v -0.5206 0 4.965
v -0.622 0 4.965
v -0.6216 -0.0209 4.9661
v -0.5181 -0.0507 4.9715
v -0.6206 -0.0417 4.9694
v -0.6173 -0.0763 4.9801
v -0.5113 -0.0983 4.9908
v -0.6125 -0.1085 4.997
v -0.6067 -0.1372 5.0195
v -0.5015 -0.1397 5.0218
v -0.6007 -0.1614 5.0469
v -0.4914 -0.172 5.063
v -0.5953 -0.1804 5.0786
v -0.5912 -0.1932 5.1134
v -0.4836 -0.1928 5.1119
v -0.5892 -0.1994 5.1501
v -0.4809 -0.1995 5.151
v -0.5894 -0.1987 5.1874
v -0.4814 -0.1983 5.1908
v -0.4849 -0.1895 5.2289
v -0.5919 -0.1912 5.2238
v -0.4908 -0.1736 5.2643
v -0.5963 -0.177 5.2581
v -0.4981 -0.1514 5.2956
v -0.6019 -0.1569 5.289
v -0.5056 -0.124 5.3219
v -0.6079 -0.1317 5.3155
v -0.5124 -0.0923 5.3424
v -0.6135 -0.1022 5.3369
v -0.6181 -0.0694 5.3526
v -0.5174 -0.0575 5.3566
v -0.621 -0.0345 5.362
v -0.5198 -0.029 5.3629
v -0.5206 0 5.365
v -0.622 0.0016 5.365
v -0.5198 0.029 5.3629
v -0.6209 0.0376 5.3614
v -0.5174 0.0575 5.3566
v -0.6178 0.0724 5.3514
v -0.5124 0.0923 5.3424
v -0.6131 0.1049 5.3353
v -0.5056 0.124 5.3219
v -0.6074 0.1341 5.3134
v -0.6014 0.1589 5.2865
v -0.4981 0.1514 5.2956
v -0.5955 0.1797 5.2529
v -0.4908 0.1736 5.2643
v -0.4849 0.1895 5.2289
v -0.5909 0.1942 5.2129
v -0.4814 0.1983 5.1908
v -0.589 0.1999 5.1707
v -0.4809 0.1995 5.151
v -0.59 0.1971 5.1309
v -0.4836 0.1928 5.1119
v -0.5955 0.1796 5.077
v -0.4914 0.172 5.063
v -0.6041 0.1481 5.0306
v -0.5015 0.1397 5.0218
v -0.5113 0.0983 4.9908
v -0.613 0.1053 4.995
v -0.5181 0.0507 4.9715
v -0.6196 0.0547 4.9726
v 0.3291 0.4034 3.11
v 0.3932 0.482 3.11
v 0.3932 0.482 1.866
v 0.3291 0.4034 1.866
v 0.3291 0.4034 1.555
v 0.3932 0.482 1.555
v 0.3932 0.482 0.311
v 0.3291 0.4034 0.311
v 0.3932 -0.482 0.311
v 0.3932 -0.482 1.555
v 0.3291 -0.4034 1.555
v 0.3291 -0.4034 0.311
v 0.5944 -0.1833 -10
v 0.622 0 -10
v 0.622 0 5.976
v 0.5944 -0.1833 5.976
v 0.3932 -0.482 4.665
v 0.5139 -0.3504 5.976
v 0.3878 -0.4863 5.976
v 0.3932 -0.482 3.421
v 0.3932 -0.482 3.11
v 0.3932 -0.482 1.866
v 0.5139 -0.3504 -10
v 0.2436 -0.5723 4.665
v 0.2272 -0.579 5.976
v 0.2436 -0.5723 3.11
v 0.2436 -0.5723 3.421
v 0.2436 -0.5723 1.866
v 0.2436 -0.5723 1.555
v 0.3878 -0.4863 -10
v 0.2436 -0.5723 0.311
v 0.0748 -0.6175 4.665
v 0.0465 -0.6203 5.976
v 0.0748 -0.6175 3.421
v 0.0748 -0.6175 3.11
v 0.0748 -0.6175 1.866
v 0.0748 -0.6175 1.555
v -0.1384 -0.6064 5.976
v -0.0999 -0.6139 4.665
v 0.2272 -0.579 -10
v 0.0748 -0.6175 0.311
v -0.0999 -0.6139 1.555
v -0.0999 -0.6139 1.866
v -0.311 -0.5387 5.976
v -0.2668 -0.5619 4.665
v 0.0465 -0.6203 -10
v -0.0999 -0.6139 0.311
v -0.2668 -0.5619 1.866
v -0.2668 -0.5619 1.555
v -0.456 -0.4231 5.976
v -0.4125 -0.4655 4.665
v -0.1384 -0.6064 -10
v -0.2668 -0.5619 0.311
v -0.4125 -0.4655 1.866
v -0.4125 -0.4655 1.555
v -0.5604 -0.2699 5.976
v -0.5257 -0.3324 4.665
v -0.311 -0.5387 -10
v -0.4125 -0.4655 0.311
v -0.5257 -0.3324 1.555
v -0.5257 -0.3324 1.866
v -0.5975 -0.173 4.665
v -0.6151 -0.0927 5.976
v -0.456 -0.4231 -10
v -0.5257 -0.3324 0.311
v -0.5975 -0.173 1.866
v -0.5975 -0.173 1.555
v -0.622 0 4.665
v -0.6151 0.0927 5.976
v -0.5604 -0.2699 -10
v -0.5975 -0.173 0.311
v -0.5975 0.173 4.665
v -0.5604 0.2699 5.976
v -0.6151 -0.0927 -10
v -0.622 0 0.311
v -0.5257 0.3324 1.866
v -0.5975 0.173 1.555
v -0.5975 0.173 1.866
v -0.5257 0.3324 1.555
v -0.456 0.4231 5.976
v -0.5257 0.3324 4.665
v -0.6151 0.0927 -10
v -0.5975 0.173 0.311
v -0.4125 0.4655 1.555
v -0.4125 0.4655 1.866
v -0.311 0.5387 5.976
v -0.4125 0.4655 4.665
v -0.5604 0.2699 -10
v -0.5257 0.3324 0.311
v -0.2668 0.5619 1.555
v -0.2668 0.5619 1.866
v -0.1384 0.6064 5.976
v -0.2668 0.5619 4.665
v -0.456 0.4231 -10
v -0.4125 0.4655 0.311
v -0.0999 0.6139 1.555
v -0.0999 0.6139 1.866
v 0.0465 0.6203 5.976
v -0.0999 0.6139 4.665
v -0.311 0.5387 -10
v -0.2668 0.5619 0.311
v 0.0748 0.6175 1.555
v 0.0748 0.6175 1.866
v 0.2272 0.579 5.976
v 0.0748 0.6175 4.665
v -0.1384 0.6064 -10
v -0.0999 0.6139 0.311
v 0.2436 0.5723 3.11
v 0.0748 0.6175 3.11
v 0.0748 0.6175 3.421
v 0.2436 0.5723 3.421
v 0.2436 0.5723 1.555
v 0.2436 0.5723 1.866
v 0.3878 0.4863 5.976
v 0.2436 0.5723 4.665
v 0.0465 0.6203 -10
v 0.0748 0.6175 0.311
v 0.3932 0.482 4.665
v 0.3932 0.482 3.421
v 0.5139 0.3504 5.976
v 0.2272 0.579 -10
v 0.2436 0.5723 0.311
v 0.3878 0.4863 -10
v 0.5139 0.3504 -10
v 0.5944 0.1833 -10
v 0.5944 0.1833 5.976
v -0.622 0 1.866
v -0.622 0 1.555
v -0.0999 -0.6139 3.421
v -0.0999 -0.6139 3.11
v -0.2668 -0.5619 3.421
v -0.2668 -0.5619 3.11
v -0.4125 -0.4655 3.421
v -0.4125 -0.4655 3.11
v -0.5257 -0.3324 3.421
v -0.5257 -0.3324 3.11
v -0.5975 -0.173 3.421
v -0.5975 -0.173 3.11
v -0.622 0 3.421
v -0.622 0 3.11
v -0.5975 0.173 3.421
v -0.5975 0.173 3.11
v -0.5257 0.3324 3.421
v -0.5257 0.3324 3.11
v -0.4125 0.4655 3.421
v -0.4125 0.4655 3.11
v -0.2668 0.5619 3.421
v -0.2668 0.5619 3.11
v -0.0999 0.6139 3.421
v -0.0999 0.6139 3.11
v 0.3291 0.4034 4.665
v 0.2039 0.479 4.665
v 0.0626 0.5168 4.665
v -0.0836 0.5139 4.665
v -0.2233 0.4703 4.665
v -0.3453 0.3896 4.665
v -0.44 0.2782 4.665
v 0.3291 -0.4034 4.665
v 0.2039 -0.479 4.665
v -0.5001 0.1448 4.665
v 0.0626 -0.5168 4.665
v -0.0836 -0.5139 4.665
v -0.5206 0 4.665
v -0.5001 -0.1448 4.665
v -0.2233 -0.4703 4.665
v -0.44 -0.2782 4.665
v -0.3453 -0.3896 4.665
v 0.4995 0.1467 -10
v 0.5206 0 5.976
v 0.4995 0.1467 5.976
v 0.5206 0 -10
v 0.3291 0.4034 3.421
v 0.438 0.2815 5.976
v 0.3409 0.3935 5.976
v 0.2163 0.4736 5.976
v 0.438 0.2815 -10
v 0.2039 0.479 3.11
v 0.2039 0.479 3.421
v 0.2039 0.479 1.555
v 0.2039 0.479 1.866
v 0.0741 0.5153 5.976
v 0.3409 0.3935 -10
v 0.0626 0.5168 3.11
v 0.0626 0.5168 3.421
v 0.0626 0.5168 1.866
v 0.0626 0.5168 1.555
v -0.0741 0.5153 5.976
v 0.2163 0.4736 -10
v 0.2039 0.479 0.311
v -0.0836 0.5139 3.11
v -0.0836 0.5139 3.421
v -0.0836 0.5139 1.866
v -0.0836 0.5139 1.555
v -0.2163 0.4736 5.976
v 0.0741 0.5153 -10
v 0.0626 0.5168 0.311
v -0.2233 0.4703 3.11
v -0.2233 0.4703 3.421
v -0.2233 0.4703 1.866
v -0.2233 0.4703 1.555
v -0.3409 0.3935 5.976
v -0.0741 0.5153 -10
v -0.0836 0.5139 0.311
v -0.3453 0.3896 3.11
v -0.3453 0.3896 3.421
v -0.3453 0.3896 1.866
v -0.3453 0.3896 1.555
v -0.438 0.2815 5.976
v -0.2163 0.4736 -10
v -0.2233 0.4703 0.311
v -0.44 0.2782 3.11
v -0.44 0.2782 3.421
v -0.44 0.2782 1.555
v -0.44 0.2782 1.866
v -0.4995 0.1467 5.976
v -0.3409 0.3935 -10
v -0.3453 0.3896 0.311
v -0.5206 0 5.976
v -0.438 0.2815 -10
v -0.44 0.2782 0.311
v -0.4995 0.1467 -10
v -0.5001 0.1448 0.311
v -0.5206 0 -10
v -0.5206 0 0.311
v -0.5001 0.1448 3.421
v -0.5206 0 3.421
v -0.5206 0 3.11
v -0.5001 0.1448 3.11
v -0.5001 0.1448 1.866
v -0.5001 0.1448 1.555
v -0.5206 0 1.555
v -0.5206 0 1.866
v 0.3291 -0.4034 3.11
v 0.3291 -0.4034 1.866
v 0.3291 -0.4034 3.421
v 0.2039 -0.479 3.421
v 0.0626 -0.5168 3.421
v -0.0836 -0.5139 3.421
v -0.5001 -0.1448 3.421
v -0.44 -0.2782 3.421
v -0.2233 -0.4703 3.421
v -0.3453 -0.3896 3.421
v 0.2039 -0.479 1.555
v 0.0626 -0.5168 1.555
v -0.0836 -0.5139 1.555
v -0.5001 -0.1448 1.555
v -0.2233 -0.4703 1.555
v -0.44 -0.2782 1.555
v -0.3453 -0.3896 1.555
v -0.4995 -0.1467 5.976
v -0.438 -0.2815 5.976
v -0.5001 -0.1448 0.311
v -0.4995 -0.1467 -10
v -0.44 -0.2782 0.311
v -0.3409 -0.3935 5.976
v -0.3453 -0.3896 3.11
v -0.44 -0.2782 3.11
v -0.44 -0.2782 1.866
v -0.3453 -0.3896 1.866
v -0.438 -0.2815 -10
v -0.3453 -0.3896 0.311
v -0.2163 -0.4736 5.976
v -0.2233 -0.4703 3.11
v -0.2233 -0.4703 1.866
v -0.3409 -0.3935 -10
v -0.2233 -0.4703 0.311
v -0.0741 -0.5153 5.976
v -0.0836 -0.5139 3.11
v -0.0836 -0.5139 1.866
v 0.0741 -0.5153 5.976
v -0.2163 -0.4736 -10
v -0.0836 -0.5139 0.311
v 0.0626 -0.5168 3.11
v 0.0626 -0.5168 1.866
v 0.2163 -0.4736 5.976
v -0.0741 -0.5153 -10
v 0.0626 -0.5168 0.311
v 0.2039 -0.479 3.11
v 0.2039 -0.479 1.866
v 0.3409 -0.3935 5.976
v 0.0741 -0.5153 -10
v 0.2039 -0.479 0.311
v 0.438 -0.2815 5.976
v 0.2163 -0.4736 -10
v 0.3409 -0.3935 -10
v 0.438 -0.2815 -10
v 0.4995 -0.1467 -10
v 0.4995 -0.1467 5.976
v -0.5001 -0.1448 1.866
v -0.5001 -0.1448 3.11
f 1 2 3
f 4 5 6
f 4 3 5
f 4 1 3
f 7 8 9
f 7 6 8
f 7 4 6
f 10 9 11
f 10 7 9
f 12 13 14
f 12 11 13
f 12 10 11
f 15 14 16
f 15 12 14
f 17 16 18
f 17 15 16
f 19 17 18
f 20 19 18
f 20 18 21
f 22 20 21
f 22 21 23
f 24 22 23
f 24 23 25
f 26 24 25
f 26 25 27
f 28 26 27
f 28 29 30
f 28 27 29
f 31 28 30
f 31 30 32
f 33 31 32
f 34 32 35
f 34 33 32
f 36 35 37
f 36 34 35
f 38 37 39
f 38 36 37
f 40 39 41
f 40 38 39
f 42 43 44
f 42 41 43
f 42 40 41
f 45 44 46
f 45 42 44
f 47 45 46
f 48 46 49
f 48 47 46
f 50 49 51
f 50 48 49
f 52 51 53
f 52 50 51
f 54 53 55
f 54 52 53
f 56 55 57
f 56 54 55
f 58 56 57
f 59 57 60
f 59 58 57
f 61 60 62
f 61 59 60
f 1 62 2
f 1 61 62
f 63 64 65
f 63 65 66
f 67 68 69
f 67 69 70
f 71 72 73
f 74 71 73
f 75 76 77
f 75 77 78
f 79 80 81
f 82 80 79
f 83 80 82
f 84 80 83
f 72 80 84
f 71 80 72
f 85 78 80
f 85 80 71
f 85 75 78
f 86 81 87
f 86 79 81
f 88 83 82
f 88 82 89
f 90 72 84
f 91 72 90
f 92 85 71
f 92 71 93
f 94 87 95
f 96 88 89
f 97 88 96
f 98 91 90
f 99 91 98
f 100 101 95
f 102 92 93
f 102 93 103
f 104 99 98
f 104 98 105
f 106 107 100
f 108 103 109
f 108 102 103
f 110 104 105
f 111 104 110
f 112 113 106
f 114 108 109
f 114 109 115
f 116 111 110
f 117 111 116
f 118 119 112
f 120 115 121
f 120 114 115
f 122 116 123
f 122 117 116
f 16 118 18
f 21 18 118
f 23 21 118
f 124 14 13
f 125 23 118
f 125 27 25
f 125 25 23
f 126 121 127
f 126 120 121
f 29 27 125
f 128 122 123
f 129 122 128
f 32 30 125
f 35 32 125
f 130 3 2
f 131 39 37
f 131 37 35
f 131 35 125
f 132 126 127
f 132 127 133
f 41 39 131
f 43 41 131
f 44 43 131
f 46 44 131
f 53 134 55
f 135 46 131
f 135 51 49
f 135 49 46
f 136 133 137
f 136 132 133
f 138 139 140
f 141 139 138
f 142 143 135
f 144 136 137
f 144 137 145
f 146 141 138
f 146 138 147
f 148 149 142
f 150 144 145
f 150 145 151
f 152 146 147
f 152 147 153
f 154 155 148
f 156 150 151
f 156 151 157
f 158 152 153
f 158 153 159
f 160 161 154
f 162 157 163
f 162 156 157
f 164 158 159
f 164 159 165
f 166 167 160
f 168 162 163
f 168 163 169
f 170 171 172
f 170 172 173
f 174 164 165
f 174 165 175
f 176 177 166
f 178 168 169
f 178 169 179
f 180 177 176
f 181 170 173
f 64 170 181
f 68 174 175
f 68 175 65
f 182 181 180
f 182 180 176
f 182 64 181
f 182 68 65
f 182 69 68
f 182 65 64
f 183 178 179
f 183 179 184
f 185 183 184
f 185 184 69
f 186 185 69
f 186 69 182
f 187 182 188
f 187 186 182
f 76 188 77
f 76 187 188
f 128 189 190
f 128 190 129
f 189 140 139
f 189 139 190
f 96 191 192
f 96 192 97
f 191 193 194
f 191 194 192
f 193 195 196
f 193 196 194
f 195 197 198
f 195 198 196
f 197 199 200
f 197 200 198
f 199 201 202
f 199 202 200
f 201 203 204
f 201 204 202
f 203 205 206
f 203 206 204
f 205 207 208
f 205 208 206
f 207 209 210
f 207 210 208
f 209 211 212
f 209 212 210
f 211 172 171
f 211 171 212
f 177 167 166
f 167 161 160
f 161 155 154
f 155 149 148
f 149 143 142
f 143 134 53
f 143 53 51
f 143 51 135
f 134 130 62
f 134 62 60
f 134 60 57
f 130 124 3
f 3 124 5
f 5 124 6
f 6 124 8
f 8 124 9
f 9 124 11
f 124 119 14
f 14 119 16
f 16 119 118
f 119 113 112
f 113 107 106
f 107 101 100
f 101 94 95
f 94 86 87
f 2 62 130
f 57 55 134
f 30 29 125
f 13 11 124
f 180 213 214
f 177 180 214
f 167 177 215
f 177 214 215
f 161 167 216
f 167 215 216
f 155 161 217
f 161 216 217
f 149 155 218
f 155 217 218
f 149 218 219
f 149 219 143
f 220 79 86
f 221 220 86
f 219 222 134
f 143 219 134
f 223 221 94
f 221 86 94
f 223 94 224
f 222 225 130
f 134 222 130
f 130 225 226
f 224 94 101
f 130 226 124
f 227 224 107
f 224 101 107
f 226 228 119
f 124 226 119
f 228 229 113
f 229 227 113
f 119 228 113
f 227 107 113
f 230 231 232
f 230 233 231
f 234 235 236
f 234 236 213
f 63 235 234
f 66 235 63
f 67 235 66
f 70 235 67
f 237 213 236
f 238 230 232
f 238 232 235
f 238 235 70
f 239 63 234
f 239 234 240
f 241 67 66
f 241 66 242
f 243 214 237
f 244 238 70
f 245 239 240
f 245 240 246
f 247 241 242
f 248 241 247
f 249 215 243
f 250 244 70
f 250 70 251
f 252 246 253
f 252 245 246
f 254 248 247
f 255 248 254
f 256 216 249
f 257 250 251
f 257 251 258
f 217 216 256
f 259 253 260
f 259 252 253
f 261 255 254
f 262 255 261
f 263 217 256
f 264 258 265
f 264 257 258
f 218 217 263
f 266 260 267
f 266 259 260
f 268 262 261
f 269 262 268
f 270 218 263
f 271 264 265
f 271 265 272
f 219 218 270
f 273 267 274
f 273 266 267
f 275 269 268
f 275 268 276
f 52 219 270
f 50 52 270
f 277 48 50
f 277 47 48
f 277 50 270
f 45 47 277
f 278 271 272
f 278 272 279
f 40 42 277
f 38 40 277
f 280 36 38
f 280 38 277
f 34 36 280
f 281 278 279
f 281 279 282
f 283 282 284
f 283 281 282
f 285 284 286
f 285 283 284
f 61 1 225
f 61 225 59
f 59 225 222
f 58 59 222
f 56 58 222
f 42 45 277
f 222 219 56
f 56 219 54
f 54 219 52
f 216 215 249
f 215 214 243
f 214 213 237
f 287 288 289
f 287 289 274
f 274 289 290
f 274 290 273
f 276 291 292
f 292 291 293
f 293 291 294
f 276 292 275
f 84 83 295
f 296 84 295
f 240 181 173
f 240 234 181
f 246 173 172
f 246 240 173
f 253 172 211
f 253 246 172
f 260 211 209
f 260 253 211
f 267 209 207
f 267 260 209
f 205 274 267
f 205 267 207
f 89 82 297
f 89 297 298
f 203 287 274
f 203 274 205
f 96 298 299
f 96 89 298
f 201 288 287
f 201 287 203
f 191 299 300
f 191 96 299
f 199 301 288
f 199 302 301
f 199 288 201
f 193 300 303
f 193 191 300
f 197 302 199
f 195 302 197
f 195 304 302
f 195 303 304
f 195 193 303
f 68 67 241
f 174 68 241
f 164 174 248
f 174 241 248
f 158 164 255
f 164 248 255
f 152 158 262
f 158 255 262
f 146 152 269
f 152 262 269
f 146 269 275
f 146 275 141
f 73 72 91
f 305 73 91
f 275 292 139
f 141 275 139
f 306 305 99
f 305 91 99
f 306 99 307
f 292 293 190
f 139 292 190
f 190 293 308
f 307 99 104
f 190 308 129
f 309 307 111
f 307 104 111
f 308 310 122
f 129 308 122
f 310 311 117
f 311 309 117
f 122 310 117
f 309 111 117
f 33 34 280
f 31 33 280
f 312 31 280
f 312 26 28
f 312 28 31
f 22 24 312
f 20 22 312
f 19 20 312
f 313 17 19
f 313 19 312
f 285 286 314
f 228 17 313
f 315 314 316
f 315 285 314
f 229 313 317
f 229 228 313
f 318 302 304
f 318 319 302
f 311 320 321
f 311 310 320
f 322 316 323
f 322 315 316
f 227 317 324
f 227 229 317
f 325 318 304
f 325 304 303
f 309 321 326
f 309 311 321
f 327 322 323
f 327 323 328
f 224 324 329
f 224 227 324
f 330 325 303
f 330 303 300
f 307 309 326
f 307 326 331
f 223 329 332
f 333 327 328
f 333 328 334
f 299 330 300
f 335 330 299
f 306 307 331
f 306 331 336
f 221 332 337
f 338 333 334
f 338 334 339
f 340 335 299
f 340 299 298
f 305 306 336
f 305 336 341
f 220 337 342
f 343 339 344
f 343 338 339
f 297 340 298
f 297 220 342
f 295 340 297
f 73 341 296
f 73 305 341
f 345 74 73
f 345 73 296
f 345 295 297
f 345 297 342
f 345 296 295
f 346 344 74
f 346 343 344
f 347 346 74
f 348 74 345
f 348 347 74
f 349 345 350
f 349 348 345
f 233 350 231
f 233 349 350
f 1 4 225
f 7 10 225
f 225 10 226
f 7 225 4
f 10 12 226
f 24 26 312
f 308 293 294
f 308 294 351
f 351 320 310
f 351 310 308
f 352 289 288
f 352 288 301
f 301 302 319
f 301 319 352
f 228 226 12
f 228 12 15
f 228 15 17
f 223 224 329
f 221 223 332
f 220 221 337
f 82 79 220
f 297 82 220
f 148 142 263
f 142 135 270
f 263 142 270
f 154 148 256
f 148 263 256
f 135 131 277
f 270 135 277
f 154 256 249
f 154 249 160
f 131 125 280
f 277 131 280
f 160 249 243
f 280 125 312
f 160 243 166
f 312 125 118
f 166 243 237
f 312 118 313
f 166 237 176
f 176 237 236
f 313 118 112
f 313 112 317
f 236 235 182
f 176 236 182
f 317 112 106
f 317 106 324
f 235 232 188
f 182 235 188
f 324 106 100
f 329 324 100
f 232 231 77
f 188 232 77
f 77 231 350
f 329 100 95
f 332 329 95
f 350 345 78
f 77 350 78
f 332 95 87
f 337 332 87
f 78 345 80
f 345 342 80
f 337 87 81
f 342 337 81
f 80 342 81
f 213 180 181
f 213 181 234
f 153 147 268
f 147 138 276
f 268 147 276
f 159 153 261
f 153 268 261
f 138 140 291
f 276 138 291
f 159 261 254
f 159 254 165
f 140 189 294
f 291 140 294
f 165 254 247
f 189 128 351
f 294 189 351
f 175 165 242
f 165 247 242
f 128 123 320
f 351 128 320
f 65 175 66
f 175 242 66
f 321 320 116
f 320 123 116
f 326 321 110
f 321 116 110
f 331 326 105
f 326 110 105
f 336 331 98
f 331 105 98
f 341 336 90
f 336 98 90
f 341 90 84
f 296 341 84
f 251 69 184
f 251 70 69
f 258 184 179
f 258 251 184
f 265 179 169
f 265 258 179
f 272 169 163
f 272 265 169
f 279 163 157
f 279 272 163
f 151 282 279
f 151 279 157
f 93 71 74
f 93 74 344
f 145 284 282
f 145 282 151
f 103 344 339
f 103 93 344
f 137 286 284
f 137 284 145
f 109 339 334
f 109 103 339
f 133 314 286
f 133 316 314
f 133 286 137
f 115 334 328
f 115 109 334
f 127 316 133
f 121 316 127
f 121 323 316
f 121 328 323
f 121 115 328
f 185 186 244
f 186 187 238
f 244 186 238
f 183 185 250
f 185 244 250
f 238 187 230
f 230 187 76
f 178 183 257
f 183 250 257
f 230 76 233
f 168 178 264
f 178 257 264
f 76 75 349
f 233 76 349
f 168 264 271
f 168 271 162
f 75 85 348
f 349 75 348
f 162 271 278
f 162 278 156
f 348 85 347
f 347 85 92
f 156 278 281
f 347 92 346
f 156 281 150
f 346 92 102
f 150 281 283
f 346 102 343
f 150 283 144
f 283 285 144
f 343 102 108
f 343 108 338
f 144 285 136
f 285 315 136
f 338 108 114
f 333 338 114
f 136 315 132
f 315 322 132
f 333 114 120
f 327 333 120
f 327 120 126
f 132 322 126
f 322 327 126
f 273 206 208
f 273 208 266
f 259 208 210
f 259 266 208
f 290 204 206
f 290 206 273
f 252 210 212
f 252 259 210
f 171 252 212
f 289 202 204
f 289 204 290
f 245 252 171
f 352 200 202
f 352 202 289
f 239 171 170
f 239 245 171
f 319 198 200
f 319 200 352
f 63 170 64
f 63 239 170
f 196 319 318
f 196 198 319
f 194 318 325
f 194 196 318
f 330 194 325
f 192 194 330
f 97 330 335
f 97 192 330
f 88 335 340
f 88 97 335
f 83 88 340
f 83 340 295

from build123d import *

# Parameters (mm, degrees)
SURFACE_EXTRUDE1_1_DEPTH   = 1.866
SURFACE_TRIM1_TOOL_2_BACK  = 3.327
SURFACE_TRIM1_TOOL_2_DEPTH = 6.654
THICKEN2_T1                = 0.101386
LPATTERN3_COUNT            = 3
LPATTERN3_PITCH            = 1.555
BOSS_EXTRUDE1_DEPTH        = 10
BOSS_EXTRUDE2_DEPTH        = 1
SKETCH7_R                  = 0.2
CUT_EXTRUDE2_DEPTH         = 11.038613849


with BuildPart() as body_1:
    # Surface-Extrude1: a surface, the sketch's curves swept straight by 1.866 mm
    with BuildLine(Plane.XY, mode=Mode.PRIVATE) as surface_extrude1_1_path:
        ThreePointArc((0.622, 0), (0, 0.622), (-0.622, 0))
    surface_extrude1_1 = Shell.extrude(surface_extrude1_1_path.wire(), (0 * SURFACE_EXTRUDE1_1_DEPTH, 0 * SURFACE_EXTRUDE1_1_DEPTH, 1 * SURFACE_EXTRUDE1_1_DEPTH))
    # Surface-Trim1 tool: a surface, the sketch's curves swept straight by 6.654 mm
    with BuildLine(Plane(origin=(0, 0, 0), x_dir=(1, 0, 0), z_dir=(0, 1, 0)).offset(-SURFACE_TRIM1_TOOL_2_BACK), mode=Mode.PRIVATE) as surface_trim1_tool_2_path:
        Line((-0.622, -1.555), (0.3932, -1.555))
        Line((0.3932, -1.555), (0.3932, -0.311))
        Line((0.3932, -0.311), (-0.622, -0.311))
    surface_trim1_tool_2 = Shell.extrude(surface_trim1_tool_2_path.wire(), (0 * SURFACE_TRIM1_TOOL_2_DEPTH, 1 * SURFACE_TRIM1_TOOL_2_DEPTH, 0 * SURFACE_TRIM1_TOOL_2_DEPTH))
    # Surface-Trim1: the surface trimmed, the side behind the tool kept
    surface_trim1_3 = split(surface_extrude1_1.faces()[0], bisect_by=surface_trim1_tool_2, keep=Keep.BOTTOM).faces()[0]
    add(Solid.thicken(surface_trim1_3, THICKEN2_T1))


with BuildPart() as lpattern3_1:
    # LPattern3: pattern copy
    add(body_1.part.moved(Location(Vector(0, 0, 1) * (1 * LPATTERN3_PITCH))))


with BuildPart() as lpattern3_2:
    # LPattern3: pattern copy
    add(body_1.part.moved(Location(Vector(0, 0, 1) * (2 * LPATTERN3_PITCH))))


with BuildPart() as body_1_1:
    add(body_1.part)

    # Combine1: read off the stored shape, not the designer's step
    # Combine1: union LPattern3_2, LPattern3_1
    add(lpattern3_2.part)
    add(lpattern3_1.part)

    # Sketch5 → Boss-Extrude1 (add)
    with BuildSketch(Plane(origin=(0, 0, 0), x_dir=(-1, 0, 0), z_dir=(0, 0, -1))):
        with BuildLine():
            Line((-0.622, 0), (-0.520614, 0))
            ThreePointArc((-0.520614, 0), (0, 0.520614), (0.520614, 0))
            Line((0.520614, 0), (0.622, 0))
            ThreePointArc((0.622, 0), (0, 0.622), (-0.622, 0))
        make_face()
    extrude(amount=BOSS_EXTRUDE1_DEPTH)

    # Sketch6 → Boss-Extrude2 (add)
    with BuildSketch(Plane.XY.offset(4.976)):
        with BuildLine():
            Line((-0.622, 0), (-0.520614, 0))
            ThreePointArc((-0.520614, 0), (0, 0.520614), (0.520614, 0))
            Line((0.520614, 0), (0.622, 0))
            ThreePointArc((0.622, 0), (0, 0.622), (-0.622, 0))
        make_face()
    extrude(amount=BOSS_EXTRUDE2_DEPTH)

    # Sketch7 → Cut-Extrude2 (cut, through all)
    with BuildSketch(Plane(origin=(0, 0, 0), x_dir=(0, 0, -1), z_dir=(1, 0, 0))):
        with Locations((-5.165, 0)):
            Circle(SKETCH7_R)
    extrude(amount=-CUT_EXTRUDE2_DEPTH, mode=Mode.SUBTRACT)

    # Mirror1: body 1 across face


with BuildPart() as body_1_2:
    add(body_1_1.part)
    add(body_1_1.part.mirror(Plane(origin=(0.571307, 0, -2.012), x_dir=(0, 0, 1), z_dir=(0, -1, 0))))


solid = body_1_2.part
